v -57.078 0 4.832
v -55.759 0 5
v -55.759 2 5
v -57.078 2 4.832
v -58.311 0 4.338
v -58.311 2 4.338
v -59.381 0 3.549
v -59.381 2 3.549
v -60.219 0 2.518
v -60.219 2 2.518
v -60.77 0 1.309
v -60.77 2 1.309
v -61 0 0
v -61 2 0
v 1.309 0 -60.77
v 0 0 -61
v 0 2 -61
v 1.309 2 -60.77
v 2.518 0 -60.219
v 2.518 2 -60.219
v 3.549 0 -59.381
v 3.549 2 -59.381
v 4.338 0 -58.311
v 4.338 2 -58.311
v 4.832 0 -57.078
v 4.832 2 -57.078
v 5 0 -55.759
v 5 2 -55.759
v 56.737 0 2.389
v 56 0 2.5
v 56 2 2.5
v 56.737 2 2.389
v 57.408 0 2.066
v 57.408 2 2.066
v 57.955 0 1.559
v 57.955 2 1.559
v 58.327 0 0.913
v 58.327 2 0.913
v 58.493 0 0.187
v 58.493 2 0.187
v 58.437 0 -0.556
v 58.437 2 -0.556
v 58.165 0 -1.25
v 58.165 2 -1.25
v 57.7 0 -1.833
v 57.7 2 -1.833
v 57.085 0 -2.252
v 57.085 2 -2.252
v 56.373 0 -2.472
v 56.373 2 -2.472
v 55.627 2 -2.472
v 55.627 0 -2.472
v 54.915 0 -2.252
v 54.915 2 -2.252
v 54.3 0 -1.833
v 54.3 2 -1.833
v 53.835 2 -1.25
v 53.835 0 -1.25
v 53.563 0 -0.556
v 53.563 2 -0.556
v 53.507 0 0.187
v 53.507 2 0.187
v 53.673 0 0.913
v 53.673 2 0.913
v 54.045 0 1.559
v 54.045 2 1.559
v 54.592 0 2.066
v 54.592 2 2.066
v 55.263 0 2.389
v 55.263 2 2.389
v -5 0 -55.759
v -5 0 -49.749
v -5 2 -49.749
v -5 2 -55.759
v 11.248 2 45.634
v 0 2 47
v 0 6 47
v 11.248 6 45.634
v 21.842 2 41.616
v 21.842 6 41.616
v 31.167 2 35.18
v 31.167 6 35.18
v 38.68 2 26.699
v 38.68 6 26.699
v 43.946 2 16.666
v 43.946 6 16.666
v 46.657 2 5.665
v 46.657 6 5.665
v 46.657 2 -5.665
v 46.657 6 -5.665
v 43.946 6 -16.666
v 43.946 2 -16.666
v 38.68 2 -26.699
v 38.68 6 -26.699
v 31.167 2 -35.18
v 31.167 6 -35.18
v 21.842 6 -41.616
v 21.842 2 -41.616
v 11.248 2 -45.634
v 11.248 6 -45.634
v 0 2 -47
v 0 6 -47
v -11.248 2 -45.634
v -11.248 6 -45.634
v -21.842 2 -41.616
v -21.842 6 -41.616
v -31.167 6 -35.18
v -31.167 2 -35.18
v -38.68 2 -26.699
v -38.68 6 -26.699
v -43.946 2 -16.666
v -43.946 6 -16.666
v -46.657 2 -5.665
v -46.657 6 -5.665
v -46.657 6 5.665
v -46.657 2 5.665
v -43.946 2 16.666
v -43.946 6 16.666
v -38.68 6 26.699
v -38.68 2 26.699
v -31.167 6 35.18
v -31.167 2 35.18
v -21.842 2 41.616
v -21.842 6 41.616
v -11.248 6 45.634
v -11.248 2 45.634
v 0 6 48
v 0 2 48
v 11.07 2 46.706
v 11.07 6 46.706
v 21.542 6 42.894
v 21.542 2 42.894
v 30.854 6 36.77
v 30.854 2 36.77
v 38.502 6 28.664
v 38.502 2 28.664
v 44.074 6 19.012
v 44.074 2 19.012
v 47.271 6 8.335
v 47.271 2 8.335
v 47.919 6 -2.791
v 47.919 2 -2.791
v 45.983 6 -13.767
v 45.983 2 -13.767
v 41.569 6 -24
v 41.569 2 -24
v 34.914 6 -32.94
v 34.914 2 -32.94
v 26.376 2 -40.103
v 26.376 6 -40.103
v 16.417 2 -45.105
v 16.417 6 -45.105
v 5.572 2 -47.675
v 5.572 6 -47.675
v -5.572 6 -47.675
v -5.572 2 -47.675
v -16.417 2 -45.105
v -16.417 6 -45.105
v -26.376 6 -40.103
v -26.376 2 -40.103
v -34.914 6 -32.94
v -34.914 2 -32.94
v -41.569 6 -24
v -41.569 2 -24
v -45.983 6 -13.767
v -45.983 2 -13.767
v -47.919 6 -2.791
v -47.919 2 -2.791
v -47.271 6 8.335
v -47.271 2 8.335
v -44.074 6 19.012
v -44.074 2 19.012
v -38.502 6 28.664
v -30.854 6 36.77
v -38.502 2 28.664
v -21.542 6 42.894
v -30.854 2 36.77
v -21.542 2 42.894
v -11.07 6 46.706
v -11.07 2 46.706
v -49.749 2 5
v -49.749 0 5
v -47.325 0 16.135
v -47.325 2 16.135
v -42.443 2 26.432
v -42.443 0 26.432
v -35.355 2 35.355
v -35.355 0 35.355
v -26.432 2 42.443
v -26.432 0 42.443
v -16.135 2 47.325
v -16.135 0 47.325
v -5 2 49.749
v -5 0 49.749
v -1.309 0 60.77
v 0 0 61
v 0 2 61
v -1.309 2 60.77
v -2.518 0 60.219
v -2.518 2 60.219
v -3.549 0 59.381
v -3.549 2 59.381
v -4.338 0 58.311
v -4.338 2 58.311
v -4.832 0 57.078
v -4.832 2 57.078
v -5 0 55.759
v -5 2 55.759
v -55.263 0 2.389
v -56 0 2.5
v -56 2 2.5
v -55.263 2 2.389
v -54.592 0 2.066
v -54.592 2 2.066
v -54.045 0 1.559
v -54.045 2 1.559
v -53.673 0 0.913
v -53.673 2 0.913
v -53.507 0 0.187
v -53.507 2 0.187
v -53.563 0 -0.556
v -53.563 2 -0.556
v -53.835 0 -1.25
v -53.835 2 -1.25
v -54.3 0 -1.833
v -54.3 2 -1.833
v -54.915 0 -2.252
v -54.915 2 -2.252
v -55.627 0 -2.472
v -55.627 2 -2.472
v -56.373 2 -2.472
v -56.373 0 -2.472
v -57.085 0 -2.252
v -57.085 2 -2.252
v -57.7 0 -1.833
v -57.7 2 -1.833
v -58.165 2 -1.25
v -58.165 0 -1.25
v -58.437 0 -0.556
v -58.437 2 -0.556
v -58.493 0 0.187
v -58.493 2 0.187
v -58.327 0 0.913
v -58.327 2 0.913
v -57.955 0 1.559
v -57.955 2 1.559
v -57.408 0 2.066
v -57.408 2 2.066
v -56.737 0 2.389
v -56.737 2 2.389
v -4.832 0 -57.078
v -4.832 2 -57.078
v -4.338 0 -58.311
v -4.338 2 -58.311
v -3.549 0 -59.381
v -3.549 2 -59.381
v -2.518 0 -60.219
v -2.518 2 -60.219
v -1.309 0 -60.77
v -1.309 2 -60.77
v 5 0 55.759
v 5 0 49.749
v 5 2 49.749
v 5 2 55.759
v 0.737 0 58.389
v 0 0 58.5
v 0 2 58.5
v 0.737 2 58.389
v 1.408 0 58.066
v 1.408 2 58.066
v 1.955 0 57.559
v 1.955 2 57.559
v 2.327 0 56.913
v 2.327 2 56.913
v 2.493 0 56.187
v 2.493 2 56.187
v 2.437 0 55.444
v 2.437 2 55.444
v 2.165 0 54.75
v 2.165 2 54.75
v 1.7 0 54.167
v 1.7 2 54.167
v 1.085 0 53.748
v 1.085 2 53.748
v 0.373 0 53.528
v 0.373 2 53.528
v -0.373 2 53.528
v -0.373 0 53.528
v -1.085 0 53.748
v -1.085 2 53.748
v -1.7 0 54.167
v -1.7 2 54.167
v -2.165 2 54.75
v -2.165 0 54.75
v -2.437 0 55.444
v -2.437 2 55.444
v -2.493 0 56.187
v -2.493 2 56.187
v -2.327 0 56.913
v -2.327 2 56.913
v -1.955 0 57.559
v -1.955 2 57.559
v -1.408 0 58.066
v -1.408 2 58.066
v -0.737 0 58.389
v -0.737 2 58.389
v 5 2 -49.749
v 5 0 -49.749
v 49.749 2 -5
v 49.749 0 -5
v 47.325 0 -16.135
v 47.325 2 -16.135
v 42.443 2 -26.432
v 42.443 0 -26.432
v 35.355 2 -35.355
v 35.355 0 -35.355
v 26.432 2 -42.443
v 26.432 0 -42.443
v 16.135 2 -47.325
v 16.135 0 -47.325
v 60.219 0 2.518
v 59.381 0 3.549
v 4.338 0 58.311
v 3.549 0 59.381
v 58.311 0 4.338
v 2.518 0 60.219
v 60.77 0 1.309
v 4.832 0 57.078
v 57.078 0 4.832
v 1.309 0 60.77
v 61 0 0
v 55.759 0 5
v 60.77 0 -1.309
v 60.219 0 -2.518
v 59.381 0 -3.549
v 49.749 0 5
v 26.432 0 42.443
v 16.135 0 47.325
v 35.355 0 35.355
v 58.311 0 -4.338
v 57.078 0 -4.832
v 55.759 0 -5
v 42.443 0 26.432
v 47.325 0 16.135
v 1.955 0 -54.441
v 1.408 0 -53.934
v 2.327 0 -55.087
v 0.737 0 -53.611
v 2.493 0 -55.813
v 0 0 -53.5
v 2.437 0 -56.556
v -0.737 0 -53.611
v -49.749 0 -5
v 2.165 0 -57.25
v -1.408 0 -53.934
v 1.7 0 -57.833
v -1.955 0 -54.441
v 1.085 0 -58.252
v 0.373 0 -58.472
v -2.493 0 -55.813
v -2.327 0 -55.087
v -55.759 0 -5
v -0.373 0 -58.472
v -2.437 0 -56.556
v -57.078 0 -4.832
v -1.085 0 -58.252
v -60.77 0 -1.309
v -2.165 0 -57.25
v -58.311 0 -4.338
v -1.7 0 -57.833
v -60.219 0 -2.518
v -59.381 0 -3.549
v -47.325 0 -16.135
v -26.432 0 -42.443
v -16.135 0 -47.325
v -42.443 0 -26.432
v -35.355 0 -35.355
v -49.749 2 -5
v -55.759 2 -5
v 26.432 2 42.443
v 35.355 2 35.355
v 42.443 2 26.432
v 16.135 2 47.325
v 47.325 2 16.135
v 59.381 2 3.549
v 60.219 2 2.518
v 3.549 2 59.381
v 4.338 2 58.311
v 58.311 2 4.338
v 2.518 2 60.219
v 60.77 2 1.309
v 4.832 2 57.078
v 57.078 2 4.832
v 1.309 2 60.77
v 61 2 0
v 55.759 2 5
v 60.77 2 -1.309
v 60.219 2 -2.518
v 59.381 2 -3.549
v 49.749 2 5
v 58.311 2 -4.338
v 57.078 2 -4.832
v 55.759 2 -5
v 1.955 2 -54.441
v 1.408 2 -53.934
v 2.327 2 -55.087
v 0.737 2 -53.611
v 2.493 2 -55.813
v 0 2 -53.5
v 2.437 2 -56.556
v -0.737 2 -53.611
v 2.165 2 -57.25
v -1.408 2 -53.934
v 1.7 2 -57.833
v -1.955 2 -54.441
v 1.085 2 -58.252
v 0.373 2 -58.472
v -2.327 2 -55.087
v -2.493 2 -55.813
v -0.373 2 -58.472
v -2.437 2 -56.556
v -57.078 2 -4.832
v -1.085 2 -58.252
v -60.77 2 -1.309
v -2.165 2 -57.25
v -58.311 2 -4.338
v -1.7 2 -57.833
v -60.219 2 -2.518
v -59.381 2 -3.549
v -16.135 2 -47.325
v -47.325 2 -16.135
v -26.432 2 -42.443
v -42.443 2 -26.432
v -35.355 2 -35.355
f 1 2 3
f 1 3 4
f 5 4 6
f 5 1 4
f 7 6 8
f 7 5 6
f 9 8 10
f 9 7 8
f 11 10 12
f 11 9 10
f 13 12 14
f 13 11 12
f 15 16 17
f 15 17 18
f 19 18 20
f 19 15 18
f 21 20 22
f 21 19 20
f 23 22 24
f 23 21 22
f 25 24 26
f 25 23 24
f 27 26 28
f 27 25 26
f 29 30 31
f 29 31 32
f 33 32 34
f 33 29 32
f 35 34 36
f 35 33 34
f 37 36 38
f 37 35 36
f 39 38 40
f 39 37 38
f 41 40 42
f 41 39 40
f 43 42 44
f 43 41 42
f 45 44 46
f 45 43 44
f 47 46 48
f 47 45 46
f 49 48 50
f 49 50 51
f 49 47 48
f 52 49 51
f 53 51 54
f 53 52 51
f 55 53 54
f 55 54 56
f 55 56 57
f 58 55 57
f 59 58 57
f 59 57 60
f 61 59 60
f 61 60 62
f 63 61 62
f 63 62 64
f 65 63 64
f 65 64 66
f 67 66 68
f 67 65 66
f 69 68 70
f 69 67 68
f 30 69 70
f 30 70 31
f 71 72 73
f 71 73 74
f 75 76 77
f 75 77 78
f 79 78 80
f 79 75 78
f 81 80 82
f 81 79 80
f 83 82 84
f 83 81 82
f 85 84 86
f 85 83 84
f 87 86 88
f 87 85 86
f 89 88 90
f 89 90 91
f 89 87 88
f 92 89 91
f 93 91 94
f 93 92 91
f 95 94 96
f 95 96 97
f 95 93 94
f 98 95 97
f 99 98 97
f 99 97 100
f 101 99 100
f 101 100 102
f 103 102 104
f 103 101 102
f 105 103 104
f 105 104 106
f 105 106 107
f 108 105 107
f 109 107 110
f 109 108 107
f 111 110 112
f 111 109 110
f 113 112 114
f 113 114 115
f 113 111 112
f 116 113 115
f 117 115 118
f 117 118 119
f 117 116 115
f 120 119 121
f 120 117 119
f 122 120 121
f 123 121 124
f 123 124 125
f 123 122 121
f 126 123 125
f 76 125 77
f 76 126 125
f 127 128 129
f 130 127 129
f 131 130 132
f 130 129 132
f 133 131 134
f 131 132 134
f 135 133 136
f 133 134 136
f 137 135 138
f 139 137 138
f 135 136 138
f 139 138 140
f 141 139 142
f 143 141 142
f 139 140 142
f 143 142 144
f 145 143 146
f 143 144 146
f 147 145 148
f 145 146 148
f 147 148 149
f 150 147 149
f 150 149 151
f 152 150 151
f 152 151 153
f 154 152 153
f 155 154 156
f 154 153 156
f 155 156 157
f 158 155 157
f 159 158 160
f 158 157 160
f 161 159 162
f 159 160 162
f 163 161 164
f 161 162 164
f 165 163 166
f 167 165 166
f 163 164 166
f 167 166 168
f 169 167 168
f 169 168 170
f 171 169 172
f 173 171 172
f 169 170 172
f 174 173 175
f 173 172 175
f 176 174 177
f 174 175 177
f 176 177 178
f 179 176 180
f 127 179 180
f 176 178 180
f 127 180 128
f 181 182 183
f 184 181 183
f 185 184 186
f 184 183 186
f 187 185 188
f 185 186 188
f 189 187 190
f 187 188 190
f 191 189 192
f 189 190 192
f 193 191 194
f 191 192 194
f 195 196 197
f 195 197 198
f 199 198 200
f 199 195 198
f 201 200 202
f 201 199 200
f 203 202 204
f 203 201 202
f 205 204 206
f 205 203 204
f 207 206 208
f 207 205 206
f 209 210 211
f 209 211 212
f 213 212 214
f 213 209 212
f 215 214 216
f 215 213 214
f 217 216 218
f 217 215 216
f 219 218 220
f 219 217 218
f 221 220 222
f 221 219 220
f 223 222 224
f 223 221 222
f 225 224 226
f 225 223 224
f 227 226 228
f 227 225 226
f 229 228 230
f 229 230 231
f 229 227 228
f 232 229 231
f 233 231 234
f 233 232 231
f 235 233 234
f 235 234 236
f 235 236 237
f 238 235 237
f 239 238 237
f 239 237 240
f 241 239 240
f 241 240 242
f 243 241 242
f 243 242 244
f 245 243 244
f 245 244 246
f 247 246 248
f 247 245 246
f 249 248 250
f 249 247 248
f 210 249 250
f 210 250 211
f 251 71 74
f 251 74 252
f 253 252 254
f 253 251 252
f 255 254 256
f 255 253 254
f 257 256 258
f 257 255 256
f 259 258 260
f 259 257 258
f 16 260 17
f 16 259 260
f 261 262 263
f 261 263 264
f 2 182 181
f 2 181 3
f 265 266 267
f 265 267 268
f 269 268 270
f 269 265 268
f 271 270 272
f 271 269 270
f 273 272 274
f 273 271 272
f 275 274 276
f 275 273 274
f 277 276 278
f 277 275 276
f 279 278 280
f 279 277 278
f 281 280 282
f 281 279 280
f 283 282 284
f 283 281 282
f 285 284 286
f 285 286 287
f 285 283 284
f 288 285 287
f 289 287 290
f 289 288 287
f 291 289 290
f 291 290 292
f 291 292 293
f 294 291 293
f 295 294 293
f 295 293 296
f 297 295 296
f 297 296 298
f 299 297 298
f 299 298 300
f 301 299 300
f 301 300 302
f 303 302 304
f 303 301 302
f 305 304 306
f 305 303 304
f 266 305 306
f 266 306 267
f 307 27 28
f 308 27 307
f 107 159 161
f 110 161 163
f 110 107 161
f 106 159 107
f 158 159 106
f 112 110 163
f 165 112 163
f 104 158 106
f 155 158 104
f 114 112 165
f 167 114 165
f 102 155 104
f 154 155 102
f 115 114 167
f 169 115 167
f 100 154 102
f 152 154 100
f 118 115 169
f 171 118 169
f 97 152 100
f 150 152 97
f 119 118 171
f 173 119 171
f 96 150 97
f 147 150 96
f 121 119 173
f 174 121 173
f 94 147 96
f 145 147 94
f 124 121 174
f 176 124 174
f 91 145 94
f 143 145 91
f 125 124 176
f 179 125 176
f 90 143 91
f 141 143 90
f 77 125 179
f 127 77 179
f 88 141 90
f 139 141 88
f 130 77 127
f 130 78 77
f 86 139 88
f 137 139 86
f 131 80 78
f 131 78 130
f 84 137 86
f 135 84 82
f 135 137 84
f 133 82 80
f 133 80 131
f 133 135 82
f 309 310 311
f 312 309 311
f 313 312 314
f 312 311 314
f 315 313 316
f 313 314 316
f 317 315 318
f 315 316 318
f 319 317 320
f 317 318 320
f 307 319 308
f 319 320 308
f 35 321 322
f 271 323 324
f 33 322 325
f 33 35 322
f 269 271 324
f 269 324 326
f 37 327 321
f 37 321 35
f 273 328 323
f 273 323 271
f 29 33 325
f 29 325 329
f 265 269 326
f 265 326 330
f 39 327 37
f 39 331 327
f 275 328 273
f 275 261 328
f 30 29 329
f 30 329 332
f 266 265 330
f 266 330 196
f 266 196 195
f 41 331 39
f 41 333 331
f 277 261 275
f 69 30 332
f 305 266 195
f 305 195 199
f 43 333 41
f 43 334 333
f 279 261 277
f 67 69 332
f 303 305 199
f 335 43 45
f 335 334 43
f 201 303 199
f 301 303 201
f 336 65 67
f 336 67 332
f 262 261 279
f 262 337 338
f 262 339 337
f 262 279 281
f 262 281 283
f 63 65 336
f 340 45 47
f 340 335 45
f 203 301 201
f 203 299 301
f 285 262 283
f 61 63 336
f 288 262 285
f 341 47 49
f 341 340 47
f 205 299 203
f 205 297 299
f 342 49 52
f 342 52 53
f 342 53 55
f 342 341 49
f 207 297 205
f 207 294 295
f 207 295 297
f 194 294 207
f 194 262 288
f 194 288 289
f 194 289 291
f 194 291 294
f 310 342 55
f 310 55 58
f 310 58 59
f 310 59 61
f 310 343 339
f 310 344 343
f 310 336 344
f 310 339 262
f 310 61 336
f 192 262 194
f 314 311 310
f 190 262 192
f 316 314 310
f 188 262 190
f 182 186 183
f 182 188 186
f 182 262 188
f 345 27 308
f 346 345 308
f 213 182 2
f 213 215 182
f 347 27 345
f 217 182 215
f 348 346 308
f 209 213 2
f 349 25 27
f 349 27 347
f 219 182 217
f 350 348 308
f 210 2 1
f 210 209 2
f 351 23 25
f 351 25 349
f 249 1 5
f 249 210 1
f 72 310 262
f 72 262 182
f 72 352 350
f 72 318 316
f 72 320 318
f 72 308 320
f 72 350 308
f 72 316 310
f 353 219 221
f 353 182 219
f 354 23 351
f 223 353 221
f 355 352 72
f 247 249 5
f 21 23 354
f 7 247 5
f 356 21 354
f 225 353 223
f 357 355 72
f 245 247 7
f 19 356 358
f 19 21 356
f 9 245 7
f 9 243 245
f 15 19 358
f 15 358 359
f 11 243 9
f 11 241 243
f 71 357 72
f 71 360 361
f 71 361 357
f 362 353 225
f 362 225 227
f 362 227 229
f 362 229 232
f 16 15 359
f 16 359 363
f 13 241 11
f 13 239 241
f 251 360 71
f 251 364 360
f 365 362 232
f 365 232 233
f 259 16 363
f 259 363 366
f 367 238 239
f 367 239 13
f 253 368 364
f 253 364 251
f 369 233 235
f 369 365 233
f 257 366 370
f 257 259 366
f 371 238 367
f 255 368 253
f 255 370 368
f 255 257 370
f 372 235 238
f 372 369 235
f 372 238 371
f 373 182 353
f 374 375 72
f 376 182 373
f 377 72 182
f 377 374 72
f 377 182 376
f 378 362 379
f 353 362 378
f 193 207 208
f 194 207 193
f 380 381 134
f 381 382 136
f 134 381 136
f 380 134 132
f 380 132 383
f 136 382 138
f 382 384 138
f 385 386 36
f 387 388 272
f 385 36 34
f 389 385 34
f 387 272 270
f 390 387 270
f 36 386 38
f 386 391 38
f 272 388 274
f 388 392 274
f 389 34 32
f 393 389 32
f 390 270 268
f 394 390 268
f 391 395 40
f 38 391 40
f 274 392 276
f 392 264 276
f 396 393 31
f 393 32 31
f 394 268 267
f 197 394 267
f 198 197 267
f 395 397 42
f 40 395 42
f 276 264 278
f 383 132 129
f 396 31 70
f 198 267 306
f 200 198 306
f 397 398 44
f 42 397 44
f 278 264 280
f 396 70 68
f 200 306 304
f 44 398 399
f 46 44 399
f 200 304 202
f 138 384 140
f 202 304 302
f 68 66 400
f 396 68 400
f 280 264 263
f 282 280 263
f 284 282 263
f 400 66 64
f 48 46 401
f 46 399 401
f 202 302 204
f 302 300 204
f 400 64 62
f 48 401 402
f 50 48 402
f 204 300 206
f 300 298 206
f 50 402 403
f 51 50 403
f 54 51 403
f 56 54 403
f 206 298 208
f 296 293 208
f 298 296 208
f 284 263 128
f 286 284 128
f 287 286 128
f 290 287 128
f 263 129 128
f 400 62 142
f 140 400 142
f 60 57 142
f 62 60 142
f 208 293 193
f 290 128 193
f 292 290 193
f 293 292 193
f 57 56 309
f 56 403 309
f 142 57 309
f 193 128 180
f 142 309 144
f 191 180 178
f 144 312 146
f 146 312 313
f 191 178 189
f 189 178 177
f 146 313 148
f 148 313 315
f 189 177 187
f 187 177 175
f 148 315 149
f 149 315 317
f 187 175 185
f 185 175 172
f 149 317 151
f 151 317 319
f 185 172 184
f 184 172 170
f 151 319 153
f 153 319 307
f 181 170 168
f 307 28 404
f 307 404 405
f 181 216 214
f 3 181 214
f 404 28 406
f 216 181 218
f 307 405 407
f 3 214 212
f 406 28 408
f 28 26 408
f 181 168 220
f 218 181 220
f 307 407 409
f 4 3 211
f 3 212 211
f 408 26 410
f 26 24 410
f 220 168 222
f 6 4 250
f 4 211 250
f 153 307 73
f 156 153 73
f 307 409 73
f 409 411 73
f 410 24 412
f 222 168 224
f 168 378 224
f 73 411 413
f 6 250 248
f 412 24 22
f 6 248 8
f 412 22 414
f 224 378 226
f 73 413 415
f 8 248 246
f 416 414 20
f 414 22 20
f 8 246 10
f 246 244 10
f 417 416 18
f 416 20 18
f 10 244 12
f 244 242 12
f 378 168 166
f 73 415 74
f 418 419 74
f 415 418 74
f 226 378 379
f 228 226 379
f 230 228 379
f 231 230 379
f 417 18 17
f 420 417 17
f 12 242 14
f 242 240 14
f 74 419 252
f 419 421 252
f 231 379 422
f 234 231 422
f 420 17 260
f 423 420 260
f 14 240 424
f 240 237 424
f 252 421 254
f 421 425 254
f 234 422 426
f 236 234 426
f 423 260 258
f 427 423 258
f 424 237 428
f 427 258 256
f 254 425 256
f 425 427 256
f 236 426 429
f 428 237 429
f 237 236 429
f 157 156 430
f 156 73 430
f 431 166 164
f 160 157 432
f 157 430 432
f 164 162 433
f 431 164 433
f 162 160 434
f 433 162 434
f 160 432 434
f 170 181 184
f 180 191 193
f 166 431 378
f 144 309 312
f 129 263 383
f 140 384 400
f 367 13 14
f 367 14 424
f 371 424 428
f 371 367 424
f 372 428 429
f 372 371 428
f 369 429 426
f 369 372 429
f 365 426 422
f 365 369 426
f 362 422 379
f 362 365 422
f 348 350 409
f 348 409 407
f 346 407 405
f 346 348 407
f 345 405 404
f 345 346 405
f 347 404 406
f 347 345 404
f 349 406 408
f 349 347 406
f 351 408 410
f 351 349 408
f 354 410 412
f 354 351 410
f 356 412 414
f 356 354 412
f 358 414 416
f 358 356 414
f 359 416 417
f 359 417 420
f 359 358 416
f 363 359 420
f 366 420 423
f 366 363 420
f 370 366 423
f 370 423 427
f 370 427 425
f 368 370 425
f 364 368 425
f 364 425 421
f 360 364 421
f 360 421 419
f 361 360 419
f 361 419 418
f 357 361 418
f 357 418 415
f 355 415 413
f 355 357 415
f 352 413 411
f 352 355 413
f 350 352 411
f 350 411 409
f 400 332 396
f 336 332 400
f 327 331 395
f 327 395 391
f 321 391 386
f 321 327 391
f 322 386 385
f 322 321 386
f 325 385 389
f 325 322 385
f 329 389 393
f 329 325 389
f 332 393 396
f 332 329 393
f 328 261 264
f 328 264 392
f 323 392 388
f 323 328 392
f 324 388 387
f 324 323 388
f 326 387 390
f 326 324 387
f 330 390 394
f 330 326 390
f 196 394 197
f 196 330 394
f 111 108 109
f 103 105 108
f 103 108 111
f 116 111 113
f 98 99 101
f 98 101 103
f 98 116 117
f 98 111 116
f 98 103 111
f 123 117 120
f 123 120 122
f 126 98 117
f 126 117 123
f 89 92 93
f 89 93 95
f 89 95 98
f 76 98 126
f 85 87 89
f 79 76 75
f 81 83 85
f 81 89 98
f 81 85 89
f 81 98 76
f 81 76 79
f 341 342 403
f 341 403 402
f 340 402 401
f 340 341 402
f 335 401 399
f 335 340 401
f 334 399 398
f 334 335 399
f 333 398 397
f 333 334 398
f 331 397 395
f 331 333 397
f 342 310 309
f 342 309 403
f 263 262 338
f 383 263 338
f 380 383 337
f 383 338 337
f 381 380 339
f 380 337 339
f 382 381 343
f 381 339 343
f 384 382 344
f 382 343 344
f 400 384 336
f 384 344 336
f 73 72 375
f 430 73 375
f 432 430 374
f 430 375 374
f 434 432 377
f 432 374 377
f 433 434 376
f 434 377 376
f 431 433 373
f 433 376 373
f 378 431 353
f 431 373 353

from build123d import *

# Parameters (mm, degrees)
SKETCH1_R           = 50
BOSS_EXTRUDE1_DEPTH = 2
SKETCH2_R           = 48
SKETCH2_R_2         = 47
BOSS_EXTRUDE2_DEPTH = 4
BOSS_EXTRUDE3_START = -2
SKETCH3_R           = 2.5
BOSS_EXTRUDE3_DEPTH = 2


with BuildPart() as part:
    # Sketch1 → Boss-Extrude1 (new body)
    with BuildSketch(Plane(origin=(0, 0, 0), x_dir=(1, 0, 0), z_dir=(0, 1, 0))):
        with Locations(Location((0, 0, 0), (0, 0, 270))):
            Circle(SKETCH1_R)
    extrude(amount=BOSS_EXTRUDE1_DEPTH)

    # Sketch2 → Boss-Extrude2 (add)
    with BuildSketch(Plane(origin=(0, 2, 0), x_dir=(1, 0, 0), z_dir=(0, 1, 0))):
        with Locations(Location((0, 0, 0), (0, 0, 270))):
            Circle(SKETCH2_R)
        with Locations(Location((0, 0, 0), (0, 0, 270))):
            Circle(SKETCH2_R_2, mode=Mode.SUBTRACT)
    extrude(amount=BOSS_EXTRUDE2_DEPTH)

    # Sketch3 → Boss-Extrude3 (add)
    # profile 1 of 4: a face of its own
    with BuildSketch(Plane(origin=(0, 2, 0), x_dir=(1, 0, 0), z_dir=(0, 1, 0)).offset(BOSS_EXTRUDE3_START)):
        with BuildLine():
            Line((-55.759371855, 5), (-49.749371855, 5))
            ThreePointArc((-49.749371855, 5), (-50, 0), (-49.749371855, -5))
            Line((-49.749371855, -5), (-55.759371855, -5))
            ThreePointArc((-55.759371855, -5), (-59.380980039, -3.54948202), (-61, 0))
            ThreePointArc((-61, 0), (-59.380980039, 3.54948202), (-55.759371855, 5))
        make_face()
        with Locations(Location((-56, 0, 0), (0, 0, 270))):
            Circle(SKETCH3_R, mode=Mode.SUBTRACT)
    # profile 2 of 4: a face of its own
    with BuildSketch(Plane(origin=(0, 2, 0), x_dir=(1, 0, 0), z_dir=(0, 1, 0)).offset(BOSS_EXTRUDE3_START)):
        with BuildLine():
            Line((5, 55.759371855), (5, 49.749371855))
            ThreePointArc((5, 49.749371855), (0, 50), (-5, 49.749371855))
            Line((-5, 49.749371855), (-5, 55.759371855))
            ThreePointArc((-5, 55.759371855), (-3.54948202, 59.380980039), (0, 61))
            ThreePointArc((0, 61), (3.54948202, 59.380980039), (5, 55.759371855))
        make_face()
        with Locations(Location((0, 56, 0), (0, 0, 270))):
            Circle(SKETCH3_R, mode=Mode.SUBTRACT)
    # profile 3 of 4: a face of its own
    with BuildSketch(Plane(origin=(0, 2, 0), x_dir=(1, 0, 0), z_dir=(0, 1, 0)).offset(BOSS_EXTRUDE3_START)):
        with BuildLine():
            Line((55.759371855, -5), (49.749371855, -5))
            ThreePointArc((49.749371855, -5), (50, 0), (49.749371855, 5))
            Line((49.749371855, 5), (55.759371855, 5))
            ThreePointArc((55.759371855, 5), (59.380980039, 3.54948202), (61, 0))
            ThreePointArc((61, 0), (59.380980039, -3.54948202), (55.759371855, -5))
        make_face()
        with Locations(Location((56, 0, 0), (0, 0, 270))):
            Circle(SKETCH3_R, mode=Mode.SUBTRACT)
    # profile 4 of 4: a face of its own
    with BuildSketch(Plane(origin=(0, 2, 0), x_dir=(1, 0, 0), z_dir=(0, 1, 0)).offset(BOSS_EXTRUDE3_START)):
        with BuildLine():
            Line((-5, -55.759371855), (-5, -49.749371855))
            ThreePointArc((-5, -49.749371855), (0, -50), (5, -49.749371855))
            Line((5, -49.749371855), (5, -55.759371855))
            ThreePointArc((5, -55.759371855), (3.54948202, -59.380980039), (0, -61))
            ThreePointArc((0, -61), (-3.54948202, -59.380980039), (-5, -55.759371855))
        make_face()
        with Locations(Location((0, -56, 0), (0, 0, 270))):
            Circle(SKETCH3_R, mode=Mode.SUBTRACT)
    extrude(amount=BOSS_EXTRUDE3_DEPTH)


solid = part.part
